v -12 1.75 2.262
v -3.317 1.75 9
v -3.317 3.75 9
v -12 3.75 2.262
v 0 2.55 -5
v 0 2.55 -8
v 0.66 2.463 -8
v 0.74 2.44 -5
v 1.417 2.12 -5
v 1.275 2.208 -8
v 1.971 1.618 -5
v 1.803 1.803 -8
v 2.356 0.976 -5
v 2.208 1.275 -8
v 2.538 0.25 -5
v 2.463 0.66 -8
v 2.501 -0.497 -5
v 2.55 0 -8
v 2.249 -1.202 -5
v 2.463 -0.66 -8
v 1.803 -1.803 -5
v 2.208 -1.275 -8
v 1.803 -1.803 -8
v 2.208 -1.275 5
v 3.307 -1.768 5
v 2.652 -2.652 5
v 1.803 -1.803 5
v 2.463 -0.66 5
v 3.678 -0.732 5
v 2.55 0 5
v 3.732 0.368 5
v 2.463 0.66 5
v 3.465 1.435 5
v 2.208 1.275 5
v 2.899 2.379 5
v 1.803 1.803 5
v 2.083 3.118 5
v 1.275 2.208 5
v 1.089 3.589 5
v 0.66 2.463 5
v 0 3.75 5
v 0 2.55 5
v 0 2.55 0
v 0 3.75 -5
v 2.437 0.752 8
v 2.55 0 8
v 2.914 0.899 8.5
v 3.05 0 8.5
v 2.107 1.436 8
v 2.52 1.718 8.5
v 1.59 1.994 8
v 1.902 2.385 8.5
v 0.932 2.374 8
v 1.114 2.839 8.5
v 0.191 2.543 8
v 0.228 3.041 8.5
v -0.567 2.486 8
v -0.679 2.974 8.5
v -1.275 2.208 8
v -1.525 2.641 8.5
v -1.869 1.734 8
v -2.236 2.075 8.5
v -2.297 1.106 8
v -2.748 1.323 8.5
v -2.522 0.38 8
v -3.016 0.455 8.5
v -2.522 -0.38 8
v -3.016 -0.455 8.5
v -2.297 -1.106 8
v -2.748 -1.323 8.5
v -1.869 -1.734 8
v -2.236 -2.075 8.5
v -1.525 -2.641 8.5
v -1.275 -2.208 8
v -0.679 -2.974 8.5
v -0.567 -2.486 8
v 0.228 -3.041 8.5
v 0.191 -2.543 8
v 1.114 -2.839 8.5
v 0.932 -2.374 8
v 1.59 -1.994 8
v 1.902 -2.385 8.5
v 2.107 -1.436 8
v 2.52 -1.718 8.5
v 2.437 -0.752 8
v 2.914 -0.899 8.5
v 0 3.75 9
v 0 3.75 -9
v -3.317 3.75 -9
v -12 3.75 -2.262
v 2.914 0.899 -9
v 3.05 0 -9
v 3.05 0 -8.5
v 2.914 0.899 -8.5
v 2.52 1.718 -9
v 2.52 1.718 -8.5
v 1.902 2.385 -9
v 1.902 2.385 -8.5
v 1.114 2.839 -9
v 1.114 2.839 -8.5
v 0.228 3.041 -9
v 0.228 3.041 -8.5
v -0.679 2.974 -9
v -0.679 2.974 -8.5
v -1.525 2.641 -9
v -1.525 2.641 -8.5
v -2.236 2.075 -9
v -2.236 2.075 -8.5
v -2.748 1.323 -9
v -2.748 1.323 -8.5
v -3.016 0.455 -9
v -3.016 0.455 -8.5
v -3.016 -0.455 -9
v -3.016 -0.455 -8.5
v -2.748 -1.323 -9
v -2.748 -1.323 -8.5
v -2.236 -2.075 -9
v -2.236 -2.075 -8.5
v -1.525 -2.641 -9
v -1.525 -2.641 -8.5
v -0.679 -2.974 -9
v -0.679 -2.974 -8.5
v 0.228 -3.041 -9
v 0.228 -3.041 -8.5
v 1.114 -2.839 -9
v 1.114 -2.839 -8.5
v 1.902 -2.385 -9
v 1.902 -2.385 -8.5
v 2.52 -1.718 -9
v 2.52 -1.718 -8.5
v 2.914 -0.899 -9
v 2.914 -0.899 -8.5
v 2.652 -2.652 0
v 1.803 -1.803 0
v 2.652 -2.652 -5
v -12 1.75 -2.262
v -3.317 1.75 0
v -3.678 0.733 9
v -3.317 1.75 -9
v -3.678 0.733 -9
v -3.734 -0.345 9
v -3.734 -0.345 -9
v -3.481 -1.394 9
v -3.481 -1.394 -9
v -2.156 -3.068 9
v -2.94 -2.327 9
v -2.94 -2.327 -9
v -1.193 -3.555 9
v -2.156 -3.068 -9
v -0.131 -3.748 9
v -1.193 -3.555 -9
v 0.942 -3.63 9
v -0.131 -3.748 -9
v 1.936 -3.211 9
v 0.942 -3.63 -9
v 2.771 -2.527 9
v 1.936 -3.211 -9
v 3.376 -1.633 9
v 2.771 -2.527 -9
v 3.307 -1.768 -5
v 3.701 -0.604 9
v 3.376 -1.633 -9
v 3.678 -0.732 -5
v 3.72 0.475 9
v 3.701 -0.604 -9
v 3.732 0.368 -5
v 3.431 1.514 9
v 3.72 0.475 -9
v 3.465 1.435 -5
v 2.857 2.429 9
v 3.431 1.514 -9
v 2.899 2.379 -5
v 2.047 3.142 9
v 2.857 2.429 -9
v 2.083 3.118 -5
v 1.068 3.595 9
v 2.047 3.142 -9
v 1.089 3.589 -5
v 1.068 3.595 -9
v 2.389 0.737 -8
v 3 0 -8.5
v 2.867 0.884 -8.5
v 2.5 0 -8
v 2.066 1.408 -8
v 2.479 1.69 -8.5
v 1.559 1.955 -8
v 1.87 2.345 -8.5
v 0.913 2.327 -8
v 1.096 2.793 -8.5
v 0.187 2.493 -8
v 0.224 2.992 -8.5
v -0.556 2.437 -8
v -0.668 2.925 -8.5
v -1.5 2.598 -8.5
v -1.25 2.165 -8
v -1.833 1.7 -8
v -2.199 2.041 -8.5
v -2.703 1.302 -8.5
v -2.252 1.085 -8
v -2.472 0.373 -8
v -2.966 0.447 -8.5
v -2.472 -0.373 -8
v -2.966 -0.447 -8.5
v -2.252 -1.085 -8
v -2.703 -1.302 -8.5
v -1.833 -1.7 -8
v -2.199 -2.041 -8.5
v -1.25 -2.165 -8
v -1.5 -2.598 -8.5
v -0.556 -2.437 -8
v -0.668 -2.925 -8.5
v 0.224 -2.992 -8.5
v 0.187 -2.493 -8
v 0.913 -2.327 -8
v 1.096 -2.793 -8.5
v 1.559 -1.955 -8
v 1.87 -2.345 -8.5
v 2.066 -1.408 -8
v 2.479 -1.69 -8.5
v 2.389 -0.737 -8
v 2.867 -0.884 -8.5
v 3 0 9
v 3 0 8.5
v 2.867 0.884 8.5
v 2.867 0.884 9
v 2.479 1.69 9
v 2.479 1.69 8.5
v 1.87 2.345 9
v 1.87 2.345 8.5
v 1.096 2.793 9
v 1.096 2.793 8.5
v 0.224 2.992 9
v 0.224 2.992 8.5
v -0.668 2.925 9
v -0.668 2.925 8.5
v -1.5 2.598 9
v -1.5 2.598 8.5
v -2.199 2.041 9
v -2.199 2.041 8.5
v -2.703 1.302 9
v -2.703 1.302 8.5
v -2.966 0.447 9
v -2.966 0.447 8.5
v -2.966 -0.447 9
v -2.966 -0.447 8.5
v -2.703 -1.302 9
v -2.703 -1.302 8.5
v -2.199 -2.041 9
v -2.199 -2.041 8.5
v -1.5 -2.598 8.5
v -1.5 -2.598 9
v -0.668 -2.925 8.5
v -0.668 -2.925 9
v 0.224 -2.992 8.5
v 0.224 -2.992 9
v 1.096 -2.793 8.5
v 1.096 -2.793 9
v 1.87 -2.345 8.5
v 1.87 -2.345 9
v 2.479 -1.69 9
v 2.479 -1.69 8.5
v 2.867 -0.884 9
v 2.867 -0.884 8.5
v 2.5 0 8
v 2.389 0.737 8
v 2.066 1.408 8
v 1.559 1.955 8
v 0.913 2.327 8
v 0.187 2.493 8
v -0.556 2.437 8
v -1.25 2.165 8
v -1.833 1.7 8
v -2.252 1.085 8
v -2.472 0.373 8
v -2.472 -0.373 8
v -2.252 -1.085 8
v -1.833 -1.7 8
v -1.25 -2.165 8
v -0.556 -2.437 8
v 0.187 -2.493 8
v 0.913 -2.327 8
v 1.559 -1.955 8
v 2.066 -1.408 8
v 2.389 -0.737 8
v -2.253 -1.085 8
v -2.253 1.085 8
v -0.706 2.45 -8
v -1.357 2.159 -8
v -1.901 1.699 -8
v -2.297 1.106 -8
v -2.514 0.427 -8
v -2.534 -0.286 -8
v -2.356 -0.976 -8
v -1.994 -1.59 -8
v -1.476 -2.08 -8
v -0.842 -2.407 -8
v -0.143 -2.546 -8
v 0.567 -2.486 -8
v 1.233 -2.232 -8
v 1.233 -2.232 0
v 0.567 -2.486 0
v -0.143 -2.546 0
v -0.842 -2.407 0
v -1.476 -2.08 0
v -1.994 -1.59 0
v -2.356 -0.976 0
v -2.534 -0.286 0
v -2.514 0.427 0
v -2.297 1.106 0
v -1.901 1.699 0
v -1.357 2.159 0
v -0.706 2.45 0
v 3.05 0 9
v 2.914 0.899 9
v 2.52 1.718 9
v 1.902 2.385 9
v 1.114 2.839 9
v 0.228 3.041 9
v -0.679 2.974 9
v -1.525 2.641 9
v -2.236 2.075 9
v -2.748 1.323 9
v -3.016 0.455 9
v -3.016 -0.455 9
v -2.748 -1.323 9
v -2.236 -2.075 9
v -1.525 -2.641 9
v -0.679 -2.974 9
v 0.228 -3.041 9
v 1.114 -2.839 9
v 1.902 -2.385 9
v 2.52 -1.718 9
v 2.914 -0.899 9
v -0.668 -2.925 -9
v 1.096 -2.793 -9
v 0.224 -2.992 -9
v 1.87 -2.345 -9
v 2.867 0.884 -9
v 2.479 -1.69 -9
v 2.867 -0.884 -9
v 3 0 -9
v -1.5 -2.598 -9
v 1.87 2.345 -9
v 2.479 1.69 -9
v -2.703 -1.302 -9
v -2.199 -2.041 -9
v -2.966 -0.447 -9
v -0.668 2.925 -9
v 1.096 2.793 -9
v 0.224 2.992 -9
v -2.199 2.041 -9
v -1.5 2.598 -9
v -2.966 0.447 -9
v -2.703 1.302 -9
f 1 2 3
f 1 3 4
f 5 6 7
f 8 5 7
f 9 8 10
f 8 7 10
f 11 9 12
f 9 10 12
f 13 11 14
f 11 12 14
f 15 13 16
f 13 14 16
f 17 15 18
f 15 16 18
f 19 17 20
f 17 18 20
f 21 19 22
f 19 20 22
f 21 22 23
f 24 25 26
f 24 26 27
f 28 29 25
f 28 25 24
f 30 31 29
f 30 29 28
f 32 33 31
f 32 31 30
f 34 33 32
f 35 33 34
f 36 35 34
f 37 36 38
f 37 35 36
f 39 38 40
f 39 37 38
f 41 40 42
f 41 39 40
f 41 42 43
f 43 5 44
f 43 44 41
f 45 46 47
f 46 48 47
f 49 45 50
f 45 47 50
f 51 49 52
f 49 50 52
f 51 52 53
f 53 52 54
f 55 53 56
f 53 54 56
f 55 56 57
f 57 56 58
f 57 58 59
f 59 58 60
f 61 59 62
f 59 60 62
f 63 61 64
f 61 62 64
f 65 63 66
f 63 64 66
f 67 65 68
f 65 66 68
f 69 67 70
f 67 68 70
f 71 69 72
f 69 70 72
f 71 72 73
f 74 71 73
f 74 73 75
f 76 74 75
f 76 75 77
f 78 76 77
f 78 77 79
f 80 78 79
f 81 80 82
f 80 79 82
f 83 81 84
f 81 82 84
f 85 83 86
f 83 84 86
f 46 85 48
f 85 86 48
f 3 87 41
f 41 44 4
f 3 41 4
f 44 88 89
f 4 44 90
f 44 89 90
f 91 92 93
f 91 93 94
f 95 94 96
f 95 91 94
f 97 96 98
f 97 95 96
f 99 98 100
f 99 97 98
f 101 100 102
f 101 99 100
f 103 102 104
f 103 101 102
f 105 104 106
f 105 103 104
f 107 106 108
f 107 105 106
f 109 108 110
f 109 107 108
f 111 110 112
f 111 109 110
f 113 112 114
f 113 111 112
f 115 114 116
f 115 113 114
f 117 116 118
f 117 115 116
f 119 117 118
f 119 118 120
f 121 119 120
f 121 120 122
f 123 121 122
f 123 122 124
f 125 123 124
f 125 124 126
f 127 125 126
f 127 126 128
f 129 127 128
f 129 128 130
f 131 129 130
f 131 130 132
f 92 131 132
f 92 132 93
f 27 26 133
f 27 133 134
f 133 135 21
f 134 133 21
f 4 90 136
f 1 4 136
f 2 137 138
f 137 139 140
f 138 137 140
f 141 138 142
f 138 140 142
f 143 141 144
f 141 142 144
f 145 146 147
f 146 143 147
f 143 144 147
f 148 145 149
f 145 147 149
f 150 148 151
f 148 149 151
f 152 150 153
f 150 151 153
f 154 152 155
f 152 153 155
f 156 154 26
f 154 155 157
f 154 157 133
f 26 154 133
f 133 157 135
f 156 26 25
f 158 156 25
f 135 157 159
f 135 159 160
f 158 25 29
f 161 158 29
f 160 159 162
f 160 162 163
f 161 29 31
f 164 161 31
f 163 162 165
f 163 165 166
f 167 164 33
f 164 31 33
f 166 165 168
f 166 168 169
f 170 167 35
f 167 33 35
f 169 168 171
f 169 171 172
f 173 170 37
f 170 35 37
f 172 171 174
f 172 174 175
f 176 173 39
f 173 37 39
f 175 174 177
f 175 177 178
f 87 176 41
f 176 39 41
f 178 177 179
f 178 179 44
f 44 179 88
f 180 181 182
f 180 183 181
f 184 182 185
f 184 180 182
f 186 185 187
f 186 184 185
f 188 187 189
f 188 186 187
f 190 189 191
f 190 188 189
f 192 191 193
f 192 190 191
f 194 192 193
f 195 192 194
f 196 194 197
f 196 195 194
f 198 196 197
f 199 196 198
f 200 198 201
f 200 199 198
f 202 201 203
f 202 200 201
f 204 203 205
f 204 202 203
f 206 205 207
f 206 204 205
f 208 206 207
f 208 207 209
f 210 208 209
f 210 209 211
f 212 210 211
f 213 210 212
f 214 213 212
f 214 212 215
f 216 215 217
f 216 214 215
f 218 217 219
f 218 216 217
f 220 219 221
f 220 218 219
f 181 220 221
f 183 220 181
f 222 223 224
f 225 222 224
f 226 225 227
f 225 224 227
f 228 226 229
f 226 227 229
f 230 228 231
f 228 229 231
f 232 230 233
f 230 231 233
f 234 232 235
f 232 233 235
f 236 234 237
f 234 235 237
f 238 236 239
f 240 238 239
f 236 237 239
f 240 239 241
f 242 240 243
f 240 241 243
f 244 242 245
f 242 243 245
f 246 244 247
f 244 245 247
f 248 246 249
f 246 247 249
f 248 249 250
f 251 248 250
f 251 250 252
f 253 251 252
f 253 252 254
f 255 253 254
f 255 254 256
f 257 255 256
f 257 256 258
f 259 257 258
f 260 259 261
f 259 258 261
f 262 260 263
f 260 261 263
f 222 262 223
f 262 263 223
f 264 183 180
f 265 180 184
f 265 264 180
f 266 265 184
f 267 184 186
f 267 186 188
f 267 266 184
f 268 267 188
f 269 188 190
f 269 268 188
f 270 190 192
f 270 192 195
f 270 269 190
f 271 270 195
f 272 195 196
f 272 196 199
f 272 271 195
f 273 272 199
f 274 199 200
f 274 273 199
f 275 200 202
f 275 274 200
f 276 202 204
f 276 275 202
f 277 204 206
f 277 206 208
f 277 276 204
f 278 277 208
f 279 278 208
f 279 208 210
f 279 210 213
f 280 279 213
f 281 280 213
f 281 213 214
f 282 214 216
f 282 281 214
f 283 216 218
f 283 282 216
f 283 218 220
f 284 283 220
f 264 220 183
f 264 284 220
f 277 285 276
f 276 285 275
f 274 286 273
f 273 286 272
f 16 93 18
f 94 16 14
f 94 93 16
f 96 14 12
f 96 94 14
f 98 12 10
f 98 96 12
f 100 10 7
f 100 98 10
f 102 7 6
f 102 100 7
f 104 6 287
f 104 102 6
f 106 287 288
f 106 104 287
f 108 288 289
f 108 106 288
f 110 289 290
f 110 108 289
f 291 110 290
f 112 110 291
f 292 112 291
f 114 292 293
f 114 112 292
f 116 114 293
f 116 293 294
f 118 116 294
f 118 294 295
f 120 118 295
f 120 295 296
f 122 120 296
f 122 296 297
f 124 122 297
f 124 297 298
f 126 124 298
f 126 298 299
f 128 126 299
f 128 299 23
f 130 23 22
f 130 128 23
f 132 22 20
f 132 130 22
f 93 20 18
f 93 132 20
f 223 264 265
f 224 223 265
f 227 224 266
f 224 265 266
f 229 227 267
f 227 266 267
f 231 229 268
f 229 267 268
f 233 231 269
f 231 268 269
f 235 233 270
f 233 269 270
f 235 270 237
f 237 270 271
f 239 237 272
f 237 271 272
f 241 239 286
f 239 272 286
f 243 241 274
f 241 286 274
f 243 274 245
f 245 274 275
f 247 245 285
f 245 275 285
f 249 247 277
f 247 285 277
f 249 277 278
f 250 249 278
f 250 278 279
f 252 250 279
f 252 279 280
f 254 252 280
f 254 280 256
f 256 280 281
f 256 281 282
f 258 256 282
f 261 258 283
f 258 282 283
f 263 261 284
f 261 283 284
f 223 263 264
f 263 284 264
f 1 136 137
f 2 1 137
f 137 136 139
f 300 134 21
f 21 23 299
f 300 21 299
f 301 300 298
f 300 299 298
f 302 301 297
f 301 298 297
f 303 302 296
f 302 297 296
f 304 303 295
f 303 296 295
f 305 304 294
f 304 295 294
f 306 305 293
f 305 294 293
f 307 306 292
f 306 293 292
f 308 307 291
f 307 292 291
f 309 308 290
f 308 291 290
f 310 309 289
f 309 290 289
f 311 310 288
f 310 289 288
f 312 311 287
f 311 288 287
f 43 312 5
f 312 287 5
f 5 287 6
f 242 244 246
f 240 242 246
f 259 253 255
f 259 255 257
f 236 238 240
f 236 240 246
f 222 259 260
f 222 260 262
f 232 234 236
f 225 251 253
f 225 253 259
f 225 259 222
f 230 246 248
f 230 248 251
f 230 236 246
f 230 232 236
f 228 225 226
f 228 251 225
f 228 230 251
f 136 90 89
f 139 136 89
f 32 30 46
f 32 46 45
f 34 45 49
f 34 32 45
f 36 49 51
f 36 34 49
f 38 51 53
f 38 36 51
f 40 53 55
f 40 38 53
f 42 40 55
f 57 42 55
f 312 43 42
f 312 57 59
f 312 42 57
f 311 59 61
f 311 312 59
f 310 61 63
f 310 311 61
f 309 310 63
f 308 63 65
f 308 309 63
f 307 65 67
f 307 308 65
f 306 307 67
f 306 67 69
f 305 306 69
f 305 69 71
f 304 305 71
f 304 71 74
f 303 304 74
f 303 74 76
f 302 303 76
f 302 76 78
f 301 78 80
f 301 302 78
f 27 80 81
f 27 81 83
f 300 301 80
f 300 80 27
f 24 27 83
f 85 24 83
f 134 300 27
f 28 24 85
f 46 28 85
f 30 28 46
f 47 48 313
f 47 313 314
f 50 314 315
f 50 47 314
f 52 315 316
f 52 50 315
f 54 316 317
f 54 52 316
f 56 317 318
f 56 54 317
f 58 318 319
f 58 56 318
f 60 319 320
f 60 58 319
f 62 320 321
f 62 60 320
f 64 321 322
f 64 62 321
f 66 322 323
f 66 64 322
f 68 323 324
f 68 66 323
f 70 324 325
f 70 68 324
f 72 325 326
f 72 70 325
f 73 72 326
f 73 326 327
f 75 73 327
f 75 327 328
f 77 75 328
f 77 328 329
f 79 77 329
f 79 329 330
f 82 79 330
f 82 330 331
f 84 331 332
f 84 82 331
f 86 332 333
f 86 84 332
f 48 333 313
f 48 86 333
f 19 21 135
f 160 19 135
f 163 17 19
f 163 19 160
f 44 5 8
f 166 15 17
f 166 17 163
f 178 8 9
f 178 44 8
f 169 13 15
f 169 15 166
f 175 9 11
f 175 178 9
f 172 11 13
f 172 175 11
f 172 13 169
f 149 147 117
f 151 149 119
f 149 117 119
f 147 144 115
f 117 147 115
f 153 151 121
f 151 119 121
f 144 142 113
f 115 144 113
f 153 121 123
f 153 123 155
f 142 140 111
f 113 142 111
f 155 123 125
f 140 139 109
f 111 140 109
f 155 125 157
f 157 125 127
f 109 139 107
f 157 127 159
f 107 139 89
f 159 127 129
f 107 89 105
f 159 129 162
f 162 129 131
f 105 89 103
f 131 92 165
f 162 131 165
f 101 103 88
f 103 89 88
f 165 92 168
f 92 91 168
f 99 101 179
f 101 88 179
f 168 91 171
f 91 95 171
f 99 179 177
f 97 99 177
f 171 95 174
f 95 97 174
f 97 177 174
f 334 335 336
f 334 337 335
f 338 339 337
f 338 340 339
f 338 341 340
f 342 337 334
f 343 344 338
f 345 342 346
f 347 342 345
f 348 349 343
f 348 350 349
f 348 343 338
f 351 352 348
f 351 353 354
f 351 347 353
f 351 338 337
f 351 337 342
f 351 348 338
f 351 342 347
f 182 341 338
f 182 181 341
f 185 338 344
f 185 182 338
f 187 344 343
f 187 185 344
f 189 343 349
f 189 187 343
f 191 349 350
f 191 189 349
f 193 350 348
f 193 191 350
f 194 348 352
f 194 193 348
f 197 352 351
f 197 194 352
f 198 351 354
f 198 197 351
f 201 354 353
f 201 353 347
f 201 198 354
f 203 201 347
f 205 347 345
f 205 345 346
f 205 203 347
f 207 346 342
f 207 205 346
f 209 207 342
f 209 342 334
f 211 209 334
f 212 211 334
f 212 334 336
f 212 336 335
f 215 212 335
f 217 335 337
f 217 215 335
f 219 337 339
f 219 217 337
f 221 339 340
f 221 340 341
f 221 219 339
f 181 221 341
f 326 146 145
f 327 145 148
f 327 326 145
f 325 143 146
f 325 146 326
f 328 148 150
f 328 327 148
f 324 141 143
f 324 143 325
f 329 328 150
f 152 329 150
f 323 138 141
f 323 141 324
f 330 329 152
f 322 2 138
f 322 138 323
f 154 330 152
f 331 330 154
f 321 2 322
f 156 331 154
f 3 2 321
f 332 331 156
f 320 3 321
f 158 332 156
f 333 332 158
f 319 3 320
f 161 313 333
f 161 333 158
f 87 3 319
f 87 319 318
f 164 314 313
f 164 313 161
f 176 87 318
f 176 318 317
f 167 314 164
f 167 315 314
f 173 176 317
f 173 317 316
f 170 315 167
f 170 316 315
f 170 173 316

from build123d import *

# Parameters (mm, degrees)
SKETCH2_R           = 2.5
BOSS_EXTRUDE1_DEPTH = 8
SKETCH3_R           = 3.75
SKETCH3_R_2         = 2.55
BOSS_EXTRUDE2_DEPTH = 8.5
SKETCH4_R           = 3
BOSS_EXTRUDE3_DEPTH = 1
CHAMFER2_SIZE       = 0.5
CHAMFER3_SIZE       = 0.5
SKETCH6_R           = 3.75
SKETCH6_R_2         = 3.05
BOSS_EXTRUDE5_DEPTH = 0.5
CUT_EXTRUDE1_DEPTH  = 5
BOSS_EXTRUDE7_DEPTH = 9
CUT_EXTRUDE2_DEPTH  = 9
MIRROR1_START       = -8
MIRROR1_2_DEPTH     = 8
MIRROR1_START_2     = -9
MIRROR1_3_OUTLINE_R = 3.05
MIRROR1_3_DEPTH     = 4
MIRROR1_4_DEPTH     = 3
MIRROR1_START_3     = -15
MIRROR1_5_OUTLINE_W = 14
MIRROR1_5_OUTLINE_H = 2
MIRROR1_5_DEPTH     = 5.856362277


with BuildPart() as part:
    # Sketch2 → Boss-Extrude1 (new body)
    with BuildSketch(Plane.XY):
        Circle(SKETCH2_R)
    extrude(amount=BOSS_EXTRUDE1_DEPTH)

    # Sketch4 → Boss-Extrude3 (add)
    with BuildSketch(Plane.XY.offset(8)):
        Circle(SKETCH4_R)
    extrude(amount=BOSS_EXTRUDE3_DEPTH)

    # Chamfer2
    chamfer2_edges = [part.edges().sort_by_distance(p)[0] for p in [
        (-3, 0, 8),
    ]]
    chamfer(chamfer2_edges, length=CHAMFER2_SIZE - 0.0001)  # a hair under: the kernel refuses the full size

    # Mirror1 6 outline → Mirror1 6 (revolve)
    with BuildSketch(Plane.XZ):
        Polygon((2.5, -8), (2.5, 0), (0, 0), (0, -9), (3, -9), (3, -8.5), align=None)
    revolve(axis=Axis((0, 0, 0), (0, 0, 1)))


with BuildPart() as body_2:
    # Sketch3 → Boss-Extrude2 (new body)
    with BuildSketch(Plane.XY):
        Circle(SKETCH3_R)
        Circle(SKETCH3_R_2, mode=Mode.SUBTRACT)
    extrude(amount=BOSS_EXTRUDE2_DEPTH)

    # Chamfer3
    chamfer3_edges = [body_2.edges().sort_by_distance(p)[0] for p in [
        (-2.55, 0, 8.5),
    ]]
    chamfer(chamfer3_edges, length=CHAMFER3_SIZE)

    # Sketch6 → Boss-Extrude5 (add)
    with BuildSketch(Plane.XY.offset(8.5)):
        Circle(SKETCH6_R)
        Circle(SKETCH6_R_2, mode=Mode.SUBTRACT)
    extrude(amount=BOSS_EXTRUDE5_DEPTH)

    # Sketch7 → Cut-Extrude1 (cut)
    with BuildSketch(Plane.XY):
        with BuildLine():
            Line((0, 2.51516471), (0, 3.75))
            ThreePointArc((0, 3.75), (3.464548247, 1.435062871), (2.651650429, -2.651650429))
            Line((2.651650429, -2.651650429), (1.778490022, -1.778490022))
            ThreePointArc((1.778490022, -1.778490022), (2.323709197, 0.962511864), (0, 2.51516471))
        make_face()
    extrude(amount=CUT_EXTRUDE1_DEPTH, mode=Mode.SUBTRACT)

    # Sketch8 → Boss-Extrude7 (add)
    with BuildSketch(Plane.XY):
        with BuildLine():
            Line((0, 3.75), (-12, 3.75))
            Line((-12, 3.75), (-12, 1.75))
            Line((-12, 1.75), (-3.031088913, 1.75))
            ThreePointArc((-3.031088913, 1.75), (-1.75, 3.031088913), (0, 3.5))
            Line((0, 3.5), (0, 3.75))
        make_face()
    extrude(amount=BOSS_EXTRUDE7_DEPTH)

    # Sketch9 → Cut-Extrude2 (cut)
    with BuildSketch(Plane.XZ.offset(-1.75)):
        Polygon((-3.31662479, 9), (-12, 2.261889819), (-12, 9), align=None)
    extrude(amount=-CUT_EXTRUDE2_DEPTH, mode=Mode.SUBTRACT)

    # Mirror1: read off the stored shape, not the designer's step
    # Mirror1 outline → Mirror1 (revolve)
    with BuildSketch(Plane.XZ):
        Polygon((2.55, -8), (3.05, -8.5), (3.05, -8), align=None)
    revolve(axis=Axis((0, 0, 0), (0, 0, 1)))

    # Mirror1 2 outline → Mirror1 2 (add)
    with BuildSketch(Plane.XY.offset(MIRROR1_START)):
        with BuildLine():
            Line((0, 3.75), (-12, 3.75))
            Line((-12, 3.75), (-12, 1.75))
            Line((-12, 1.75), (-3.31662479, 1.75))
            ThreePointArc((-3.31662479, 1.75), (-2.225798587, -3.017999445), (2.65165043, -2.65165043))
            Line((2.65165043, -2.65165043), (1.803122292, -1.803122292))
            ThreePointArc((1.803122292, -1.803122292), (-2.355892808, -0.975842753), (0, 2.55))
            Line((0, 2.55), (0, 3.75))
        make_face()
    extrude(amount=MIRROR1_2_DEPTH)

    # Mirror1 3 outline → Mirror1 3 (add)
    with BuildSketch(Plane.XY.offset(MIRROR1_START_2)):
        with BuildLine():
            Line((0, 3.75), (-12, 3.75))
            Line((-12, 3.75), (-12, 1.75))
            Line((-12, 1.75), (-3.31662479, 1.75))
            ThreePointArc((-3.31662479, 1.75), (1.936491674, -3.211308145), (0, 3.75))
        make_face()
        Circle(MIRROR1_3_OUTLINE_R, mode=Mode.SUBTRACT)
    extrude(amount=MIRROR1_3_DEPTH)

    # Mirror1 4 outline → Mirror1 4 (add)
    with BuildSketch(Plane.XY.offset(MIRROR1_START)):
        with BuildLine():
            ThreePointArc((2.156675683, -2.156675683), (2.817832574, 1.167184469), (0, 3.05))
            Line((0, 3.05), (0, 2.55))
            ThreePointArc((0, 2.55), (2.355892808, 0.975842753), (1.803122292, -1.803122292))
            Line((1.803122292, -1.803122292), (2.156675683, -2.156675683))
        make_face()
    extrude(amount=MIRROR1_4_DEPTH)

    # Mirror1 5 outline → Mirror1 5 (cut)
    with BuildSketch(Plane(origin=(0, 0, 0), x_dir=(0.7900407033397415, 0, -0.6130543916052199), z_dir=(0.6130543916052199, 0, 0.7900407033397417)).offset(MIRROR1_START_3)):
        with Locations((-3, 2.75)):
            Rectangle(MIRROR1_5_OUTLINE_W, MIRROR1_5_OUTLINE_H)
    extrude(amount=MIRROR1_5_DEPTH, mode=Mode.SUBTRACT)


solid = Compound([part.part, body_2.part])
